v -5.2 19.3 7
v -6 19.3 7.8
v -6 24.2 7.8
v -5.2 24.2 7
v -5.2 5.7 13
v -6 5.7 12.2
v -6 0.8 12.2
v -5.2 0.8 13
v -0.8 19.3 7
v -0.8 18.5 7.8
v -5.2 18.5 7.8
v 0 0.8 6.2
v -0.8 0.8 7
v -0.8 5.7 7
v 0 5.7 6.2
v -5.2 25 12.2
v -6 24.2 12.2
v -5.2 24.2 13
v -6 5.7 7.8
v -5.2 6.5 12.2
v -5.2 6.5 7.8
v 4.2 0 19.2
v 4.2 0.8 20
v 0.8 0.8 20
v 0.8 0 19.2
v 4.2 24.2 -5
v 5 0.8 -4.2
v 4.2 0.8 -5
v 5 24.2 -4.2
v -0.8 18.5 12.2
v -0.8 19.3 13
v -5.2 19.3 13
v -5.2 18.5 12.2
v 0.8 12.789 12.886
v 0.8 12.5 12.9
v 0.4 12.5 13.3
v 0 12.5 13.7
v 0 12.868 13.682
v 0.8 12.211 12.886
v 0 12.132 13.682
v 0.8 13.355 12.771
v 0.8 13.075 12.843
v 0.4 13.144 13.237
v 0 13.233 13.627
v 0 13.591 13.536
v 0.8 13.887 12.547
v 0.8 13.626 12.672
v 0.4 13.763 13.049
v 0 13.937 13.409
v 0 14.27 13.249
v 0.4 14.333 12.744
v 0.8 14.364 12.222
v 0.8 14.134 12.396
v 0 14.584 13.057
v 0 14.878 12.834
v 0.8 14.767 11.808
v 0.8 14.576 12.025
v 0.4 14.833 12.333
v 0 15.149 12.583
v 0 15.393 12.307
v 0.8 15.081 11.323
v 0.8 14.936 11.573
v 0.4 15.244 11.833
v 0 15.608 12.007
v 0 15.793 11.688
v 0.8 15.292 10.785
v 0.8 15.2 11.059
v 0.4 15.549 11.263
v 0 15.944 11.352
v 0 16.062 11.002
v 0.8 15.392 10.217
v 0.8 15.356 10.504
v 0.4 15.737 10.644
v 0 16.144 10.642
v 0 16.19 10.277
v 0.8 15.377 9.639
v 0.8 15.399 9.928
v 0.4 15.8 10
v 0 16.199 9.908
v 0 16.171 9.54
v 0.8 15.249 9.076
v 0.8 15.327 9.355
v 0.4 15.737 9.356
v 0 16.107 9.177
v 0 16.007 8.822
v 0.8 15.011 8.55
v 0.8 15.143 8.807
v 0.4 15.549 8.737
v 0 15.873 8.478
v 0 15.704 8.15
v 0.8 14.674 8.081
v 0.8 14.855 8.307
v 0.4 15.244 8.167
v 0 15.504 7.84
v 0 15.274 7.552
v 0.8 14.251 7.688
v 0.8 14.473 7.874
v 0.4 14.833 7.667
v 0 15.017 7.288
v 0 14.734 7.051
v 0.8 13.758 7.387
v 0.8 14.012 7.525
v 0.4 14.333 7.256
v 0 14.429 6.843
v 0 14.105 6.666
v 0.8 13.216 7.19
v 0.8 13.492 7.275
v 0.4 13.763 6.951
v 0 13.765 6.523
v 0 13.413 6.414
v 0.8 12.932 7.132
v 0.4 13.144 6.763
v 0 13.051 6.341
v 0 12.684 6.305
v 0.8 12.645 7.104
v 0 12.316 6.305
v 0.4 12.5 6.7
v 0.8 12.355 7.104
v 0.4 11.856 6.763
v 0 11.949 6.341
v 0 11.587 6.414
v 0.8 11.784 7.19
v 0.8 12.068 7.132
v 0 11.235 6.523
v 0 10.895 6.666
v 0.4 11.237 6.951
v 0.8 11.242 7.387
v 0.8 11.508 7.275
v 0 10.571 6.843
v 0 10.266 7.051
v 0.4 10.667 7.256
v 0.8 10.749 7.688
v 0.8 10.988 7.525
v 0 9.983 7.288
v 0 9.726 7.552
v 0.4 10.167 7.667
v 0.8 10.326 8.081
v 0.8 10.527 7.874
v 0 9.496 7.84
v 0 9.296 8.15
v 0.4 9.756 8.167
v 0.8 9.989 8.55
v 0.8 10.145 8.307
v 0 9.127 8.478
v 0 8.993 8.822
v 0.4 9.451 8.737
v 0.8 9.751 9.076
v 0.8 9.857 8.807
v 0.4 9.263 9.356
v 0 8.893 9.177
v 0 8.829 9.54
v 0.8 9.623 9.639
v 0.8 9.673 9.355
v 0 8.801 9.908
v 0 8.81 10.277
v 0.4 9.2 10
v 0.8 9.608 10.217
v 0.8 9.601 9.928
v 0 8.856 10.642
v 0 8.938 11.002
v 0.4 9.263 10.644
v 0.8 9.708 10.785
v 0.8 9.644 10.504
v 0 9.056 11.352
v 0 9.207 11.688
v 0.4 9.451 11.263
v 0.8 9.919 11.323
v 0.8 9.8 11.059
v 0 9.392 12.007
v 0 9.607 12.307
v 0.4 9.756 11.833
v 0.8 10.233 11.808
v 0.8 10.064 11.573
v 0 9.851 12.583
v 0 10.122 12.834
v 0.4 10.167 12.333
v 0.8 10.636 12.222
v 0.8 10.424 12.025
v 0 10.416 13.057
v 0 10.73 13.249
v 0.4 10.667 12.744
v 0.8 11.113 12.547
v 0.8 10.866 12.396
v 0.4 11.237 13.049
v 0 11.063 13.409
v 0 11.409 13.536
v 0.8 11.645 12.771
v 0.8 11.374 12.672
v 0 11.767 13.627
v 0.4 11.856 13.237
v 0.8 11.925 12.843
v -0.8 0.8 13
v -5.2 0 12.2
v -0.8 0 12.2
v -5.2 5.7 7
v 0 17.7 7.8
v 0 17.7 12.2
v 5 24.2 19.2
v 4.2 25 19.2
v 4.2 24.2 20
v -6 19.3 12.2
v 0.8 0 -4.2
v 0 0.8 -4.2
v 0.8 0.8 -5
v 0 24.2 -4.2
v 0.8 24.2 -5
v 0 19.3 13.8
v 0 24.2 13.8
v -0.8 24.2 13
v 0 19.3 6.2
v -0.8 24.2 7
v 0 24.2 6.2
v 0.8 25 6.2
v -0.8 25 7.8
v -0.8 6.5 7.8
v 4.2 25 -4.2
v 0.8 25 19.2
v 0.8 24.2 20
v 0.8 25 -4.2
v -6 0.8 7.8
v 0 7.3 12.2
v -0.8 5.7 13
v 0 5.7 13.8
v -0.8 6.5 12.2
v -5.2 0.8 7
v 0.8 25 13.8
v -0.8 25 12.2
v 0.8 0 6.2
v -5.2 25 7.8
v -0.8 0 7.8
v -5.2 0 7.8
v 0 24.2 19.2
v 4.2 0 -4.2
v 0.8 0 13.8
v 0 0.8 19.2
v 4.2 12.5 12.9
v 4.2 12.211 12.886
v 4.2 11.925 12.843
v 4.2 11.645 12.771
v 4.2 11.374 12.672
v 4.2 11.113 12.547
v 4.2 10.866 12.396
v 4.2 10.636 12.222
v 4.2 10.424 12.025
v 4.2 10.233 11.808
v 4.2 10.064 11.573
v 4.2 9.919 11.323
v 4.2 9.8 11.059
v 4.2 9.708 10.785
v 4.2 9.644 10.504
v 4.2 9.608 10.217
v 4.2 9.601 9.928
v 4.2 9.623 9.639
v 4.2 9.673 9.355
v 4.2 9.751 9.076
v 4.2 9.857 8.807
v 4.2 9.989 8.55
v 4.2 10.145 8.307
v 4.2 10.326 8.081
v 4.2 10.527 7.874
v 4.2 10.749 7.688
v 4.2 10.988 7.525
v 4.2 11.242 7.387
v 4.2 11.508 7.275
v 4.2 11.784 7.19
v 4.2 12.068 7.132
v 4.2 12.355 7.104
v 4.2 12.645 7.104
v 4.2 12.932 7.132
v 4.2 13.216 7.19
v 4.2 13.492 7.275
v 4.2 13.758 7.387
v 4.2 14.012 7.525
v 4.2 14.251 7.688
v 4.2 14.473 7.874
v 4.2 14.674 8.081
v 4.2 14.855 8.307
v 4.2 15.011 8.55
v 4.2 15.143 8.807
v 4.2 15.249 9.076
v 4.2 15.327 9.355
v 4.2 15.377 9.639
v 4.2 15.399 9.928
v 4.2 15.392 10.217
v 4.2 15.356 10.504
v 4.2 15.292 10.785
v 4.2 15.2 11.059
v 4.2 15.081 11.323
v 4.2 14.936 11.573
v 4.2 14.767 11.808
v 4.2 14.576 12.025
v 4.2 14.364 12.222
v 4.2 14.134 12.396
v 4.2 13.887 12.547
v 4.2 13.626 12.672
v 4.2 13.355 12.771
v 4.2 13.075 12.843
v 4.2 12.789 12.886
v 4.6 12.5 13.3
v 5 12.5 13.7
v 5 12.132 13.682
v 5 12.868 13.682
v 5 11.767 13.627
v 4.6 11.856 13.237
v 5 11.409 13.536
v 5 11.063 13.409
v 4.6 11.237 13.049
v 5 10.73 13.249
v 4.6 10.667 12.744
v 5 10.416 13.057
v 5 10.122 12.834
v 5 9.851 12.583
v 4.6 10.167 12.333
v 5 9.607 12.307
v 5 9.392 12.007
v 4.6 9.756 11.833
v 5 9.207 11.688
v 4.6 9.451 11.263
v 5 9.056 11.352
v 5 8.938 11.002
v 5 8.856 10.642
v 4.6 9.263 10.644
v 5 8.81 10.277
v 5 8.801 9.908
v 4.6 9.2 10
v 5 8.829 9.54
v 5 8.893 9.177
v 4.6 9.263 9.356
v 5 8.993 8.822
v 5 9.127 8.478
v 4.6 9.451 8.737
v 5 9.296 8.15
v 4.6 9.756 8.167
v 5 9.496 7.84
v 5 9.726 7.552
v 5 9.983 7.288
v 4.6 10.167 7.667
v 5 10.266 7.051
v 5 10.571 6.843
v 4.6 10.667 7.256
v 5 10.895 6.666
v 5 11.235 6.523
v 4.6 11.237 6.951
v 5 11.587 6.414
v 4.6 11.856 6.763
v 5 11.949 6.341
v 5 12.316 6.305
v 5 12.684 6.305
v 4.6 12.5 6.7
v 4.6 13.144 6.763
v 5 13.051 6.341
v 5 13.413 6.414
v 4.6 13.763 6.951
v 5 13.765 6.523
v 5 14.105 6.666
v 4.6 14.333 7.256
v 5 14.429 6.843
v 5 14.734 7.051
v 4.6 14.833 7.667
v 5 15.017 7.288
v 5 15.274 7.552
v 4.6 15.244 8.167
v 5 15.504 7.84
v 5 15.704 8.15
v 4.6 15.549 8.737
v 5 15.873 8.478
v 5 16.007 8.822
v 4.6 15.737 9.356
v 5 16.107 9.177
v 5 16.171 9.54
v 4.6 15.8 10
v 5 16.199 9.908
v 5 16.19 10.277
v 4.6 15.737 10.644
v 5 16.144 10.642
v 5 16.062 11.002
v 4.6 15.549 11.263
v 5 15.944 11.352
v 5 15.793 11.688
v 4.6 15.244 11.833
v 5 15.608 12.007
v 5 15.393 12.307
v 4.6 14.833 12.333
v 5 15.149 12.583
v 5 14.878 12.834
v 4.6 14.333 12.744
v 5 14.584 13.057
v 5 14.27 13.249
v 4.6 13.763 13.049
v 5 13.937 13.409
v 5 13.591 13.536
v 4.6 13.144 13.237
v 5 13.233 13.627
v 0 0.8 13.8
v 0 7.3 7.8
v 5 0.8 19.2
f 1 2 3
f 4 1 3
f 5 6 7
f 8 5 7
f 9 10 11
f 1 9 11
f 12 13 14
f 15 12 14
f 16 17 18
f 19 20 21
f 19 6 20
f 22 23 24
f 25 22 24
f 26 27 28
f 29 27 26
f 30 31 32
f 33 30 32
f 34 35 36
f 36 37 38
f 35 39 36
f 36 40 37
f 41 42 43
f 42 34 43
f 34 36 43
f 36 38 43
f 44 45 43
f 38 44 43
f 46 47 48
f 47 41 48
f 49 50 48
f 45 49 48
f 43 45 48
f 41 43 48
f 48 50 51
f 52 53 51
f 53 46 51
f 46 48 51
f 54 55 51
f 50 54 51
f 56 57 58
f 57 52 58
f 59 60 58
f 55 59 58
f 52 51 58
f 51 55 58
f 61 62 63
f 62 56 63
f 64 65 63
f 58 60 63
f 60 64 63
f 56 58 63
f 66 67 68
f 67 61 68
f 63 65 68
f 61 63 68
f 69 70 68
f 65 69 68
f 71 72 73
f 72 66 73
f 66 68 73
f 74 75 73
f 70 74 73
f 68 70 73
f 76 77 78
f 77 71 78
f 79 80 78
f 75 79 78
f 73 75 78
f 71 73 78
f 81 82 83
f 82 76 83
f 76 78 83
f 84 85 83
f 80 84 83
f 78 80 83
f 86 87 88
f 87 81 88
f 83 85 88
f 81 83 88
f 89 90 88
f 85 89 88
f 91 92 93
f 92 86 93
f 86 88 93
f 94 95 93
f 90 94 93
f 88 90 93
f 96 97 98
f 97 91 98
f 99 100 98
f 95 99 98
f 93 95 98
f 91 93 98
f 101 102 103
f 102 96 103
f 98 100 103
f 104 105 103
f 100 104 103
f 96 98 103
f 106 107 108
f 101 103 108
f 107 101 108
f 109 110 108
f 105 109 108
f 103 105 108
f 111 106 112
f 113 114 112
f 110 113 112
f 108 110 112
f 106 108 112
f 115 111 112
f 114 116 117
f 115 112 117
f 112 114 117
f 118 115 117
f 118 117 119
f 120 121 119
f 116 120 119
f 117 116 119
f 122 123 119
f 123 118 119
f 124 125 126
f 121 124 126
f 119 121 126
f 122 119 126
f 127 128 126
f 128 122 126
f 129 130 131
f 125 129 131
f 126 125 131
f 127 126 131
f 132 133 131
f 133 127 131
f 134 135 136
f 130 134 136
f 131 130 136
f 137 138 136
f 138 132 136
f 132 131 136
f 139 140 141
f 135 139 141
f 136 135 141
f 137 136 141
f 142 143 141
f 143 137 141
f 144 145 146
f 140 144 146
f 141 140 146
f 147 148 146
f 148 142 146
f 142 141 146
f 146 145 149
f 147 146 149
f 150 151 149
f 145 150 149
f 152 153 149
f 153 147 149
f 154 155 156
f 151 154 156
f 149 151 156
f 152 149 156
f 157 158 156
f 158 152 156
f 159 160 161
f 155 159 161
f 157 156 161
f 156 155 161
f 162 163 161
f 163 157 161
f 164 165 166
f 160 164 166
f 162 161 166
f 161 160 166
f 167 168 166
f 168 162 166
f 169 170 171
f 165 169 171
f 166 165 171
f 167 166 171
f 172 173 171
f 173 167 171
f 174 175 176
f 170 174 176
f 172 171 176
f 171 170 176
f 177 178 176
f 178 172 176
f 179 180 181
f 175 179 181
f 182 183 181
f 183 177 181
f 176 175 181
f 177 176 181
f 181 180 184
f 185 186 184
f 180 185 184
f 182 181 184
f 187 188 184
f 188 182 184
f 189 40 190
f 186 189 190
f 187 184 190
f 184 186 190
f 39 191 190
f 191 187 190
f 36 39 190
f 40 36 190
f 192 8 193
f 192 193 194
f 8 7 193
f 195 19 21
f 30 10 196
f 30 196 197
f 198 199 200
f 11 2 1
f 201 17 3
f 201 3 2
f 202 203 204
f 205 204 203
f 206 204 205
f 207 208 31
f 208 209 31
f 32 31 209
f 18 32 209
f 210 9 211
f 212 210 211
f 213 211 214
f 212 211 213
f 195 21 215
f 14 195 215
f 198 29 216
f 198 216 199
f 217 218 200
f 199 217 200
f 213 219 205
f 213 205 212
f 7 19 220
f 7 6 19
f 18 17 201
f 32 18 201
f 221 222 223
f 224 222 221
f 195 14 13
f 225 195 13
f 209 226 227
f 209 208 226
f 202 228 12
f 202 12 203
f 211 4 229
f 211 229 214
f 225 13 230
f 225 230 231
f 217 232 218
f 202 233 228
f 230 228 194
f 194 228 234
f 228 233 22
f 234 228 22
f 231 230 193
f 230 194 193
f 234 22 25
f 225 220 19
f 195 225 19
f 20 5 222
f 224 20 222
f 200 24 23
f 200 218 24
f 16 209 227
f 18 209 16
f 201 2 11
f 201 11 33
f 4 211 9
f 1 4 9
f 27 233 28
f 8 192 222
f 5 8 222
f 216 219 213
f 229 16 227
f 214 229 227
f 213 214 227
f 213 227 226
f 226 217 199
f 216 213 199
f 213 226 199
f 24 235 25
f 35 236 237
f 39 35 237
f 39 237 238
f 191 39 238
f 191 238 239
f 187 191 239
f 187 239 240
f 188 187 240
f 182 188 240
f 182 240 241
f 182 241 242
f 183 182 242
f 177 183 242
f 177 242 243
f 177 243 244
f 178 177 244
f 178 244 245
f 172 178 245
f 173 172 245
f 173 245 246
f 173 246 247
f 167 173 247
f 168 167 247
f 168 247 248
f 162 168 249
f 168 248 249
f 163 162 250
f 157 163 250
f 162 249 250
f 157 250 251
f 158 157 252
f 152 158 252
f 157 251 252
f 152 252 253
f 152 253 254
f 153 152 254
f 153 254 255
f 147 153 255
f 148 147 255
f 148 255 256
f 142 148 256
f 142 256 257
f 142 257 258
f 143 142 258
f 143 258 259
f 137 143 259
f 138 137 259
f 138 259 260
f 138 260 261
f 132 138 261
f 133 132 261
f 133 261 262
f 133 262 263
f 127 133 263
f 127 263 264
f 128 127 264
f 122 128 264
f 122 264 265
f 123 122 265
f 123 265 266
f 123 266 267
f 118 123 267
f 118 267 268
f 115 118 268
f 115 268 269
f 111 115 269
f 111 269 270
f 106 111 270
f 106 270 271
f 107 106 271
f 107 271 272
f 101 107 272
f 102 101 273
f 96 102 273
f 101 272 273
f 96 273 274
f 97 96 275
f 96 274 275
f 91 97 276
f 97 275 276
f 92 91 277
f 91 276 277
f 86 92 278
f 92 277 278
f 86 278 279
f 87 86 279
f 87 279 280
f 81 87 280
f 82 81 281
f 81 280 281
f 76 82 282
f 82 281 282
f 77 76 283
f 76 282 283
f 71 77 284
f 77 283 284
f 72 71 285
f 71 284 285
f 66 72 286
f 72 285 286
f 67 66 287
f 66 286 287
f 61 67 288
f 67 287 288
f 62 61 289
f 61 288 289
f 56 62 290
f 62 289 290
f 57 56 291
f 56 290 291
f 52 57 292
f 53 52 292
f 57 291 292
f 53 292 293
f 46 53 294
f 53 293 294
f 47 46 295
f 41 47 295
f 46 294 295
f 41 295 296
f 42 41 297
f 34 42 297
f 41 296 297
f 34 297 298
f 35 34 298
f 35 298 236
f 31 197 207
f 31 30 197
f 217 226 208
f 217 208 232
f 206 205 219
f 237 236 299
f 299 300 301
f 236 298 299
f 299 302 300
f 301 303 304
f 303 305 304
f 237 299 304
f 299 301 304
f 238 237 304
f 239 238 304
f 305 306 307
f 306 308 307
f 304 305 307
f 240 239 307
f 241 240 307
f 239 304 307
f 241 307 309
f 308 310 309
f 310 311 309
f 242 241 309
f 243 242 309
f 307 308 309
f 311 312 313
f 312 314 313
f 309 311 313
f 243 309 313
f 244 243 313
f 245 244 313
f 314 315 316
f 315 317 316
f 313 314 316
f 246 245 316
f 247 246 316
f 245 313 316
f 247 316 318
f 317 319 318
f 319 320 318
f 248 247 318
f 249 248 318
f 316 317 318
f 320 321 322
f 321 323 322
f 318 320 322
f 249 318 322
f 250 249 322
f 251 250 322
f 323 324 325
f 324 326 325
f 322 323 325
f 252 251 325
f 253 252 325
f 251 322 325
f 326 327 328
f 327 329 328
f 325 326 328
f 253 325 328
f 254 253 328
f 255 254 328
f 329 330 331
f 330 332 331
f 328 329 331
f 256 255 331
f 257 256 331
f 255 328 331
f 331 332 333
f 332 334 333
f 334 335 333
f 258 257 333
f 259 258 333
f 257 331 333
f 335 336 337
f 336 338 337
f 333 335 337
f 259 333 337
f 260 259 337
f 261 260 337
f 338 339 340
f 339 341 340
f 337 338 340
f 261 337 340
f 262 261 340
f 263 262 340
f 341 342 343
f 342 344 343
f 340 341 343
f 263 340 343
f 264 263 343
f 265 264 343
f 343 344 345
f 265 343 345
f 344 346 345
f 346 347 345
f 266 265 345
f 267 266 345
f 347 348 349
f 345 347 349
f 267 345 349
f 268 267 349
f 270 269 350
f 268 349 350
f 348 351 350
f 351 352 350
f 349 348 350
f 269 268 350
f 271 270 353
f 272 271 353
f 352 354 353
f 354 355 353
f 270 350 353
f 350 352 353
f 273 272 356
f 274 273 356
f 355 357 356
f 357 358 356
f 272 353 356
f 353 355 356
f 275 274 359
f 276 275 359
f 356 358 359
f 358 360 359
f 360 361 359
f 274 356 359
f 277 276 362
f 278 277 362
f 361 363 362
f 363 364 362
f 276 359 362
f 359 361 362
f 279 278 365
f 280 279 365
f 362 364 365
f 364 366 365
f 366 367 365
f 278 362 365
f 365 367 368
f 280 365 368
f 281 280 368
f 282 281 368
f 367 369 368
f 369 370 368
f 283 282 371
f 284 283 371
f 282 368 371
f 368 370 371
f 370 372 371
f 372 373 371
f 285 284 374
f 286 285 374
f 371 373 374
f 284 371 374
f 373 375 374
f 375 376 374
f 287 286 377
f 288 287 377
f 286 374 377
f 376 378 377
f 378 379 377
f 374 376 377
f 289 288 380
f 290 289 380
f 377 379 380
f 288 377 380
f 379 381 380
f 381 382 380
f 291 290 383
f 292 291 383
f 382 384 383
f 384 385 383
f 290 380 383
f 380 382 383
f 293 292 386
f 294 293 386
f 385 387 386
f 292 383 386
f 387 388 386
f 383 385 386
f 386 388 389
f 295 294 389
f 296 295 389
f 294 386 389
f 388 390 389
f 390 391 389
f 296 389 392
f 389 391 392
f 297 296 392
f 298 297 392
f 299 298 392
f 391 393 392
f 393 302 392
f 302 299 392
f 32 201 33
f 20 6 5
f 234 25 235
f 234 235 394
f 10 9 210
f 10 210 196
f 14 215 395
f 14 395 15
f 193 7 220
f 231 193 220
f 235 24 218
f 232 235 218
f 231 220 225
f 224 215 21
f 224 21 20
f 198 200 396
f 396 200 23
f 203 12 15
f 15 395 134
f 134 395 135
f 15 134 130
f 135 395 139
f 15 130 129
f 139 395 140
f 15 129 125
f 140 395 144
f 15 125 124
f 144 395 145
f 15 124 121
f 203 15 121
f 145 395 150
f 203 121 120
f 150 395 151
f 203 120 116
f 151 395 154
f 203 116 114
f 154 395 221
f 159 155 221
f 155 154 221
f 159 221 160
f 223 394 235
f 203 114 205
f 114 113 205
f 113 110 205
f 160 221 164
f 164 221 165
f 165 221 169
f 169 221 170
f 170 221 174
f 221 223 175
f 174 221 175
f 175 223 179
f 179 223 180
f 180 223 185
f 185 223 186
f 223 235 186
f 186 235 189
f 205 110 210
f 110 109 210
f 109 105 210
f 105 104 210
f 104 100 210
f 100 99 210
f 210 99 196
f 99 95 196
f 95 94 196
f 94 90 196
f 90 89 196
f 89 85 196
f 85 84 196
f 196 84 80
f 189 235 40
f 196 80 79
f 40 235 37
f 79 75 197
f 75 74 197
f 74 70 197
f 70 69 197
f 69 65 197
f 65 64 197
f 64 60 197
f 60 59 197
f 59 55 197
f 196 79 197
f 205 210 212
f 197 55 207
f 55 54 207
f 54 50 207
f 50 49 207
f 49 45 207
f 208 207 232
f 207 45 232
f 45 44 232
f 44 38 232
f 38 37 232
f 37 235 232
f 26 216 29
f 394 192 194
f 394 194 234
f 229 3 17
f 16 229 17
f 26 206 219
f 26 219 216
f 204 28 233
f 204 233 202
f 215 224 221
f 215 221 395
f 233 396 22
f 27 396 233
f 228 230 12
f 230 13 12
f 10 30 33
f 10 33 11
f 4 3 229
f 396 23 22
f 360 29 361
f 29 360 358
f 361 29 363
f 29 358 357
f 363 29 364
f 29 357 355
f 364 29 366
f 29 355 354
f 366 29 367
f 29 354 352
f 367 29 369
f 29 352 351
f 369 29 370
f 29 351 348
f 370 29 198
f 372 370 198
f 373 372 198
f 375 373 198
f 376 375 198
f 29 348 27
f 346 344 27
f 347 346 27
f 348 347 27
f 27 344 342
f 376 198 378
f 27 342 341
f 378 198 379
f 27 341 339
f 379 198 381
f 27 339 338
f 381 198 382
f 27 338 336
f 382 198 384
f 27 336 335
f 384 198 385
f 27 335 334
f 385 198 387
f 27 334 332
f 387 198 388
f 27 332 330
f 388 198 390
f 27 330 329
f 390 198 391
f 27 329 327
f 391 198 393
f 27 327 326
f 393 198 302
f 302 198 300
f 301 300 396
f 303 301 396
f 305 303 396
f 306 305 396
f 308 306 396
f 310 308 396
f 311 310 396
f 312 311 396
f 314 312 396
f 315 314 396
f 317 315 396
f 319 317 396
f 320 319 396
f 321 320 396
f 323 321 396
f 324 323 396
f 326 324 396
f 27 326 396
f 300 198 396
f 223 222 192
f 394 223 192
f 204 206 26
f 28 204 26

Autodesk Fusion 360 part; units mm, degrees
sketch "Bracket Profile" plane through (0, 0, 0) normal (0, 0, 1) x (1, 0, 0) in component "Bracket"
  line L0 (0, 0) -> (0, 25)
  line L1 (0, 25) -> (5, 25)
  line L2 (5, 25) -> (5, 20)
  line L3 (5, 20) -> (5, 0)
  line L4 (5, 0) -> (0, 0)
  dimension "d1" = 5
  dimension "d2" = 5
  dimension "d3" = 25
  dimension "d4" = 5
extrude "Extrude1" add sketch "Bracket Profile" along normal blind 20 in component "Bracket"
sketch "Clearance Hole" plane through (0, 0, 0) normal (-1, 0, 0) x (0, -1, 0) in component "Bracket"
  line L0 (-25, 0) -> (0, 0)
  line L1 (0, 0) -> (0, 20)
  line L2 (0, 20) -> (-25, 20)
  line L3 (-25, 20) -> (-25, 0)
  line L4 (-25, 10) -> (0, 10) construction
  line L5 (-12.5, 20) -> (-12.5, 0) construction
  circle A0 centre (-12.5, 10) radius 2.9
  circle A1 centre (-12.5, 10) radius 4.5
  line L6 (0, 13) -> (-25, 13)
  line L7 (-25, 13) -> (-25, 7)
  line L8 (-25, 7) -> (0, 7)
  line L9 (0, 7) -> (0, 13)
  line L10 (0, 13) -> (-25, 7) construction
  line L11 (-25, 13) -> (0, 7) construction
  line L12 (-6.5, 13) -> (-18.5, 13)
  line L13 (-18.5, 13) -> (-18.5, 7)
  line L14 (-18.5, 7) -> (-6.5, 7)
  line L15 (-6.5, 7) -> (-6.5, 13)
  line L16 (-6.5, 13) -> (-18.5, 7) construction
  line L17 (-18.5, 13) -> (-6.5, 7) construction
  point P0 (-12.5, 10)
  point P1 (-12.5, 10)
  dimension "d9" = 5.8
  dimension "d13" = 9
  dimension "d20" = 25
  dimension "d21" = 6
  dimension "d24" = 12
  dimension "d25" = 6
extrude "Extrude3" add sketch "Clearance Hole" along normal blind 6 contours L3 L6 L7 L8 L13 | L1 L6 L8 L9 L15 in component "Bracket"
hole "Hole1" at (0, 12.5, 10) direction (1, 0, 0) diameter 5.8 end through all in component "Bracket"
sketch "Sketch3" plane through (0, 25, 0) normal (0, 1, 0) x (-1, 0, 0) in component "Bracket"
  line L0 (-5, 0) -> (0, 0)
  line L1 (0, 0) -> (0, 7)
  line L2 (0, 7) -> (6, 7)
  line L3 (6, 7) -> (6, 13)
  line L4 (6, 13) -> (0, 13)
  line L5 (0, 13) -> (0, 20)
  line L6 (0, 20) -> (-5, 20)
  line L7 (0, 20) -> (-25, 20)
  line L8 (-25, 20) -> (-25, 15)
  line L9 (-25, 15) -> (0, 15)
  line L10 (0, 15) -> (0, 20)
  line L11 (-5, 20) -> (-5, 0)
  dimension "d28" = 25
  dimension "d29" = 5
extrude "Extrude5" add 1 faces at (1.6667, 16.6667, 0) along direction (0, 0, -1) blind 5 in component "Bracket"
chamfer "Chamfer2" distance 0.8 angle 45 12 faces at (0, 12.5, -0.9667) (-6, 4.3333, 11) (-6, 22.8333, 11) (3.3333, 25, 7.3333) (1.6667, 16.6667, 20) (-2, 20.6667, 13) (-2, 2.1667, 13) (-2, 6.5, 9) (-4, 18.5, 9) (3.3333, 0, 7.3333) (5, 12.5, -0.9667) (1.6667, 16.6667, -5) in component "Bracket"
component "Bracket" placed x (1, 0, 0) y (0, 1, 0) z (0, 0, 1) at (0, 0, 0)
equation "d1 = BracketLipSize"
equation "d2 = BracketLipSize"
equation "d3 = ExtrusionSize + BracketLipSize"
equation "d4 = BracketLipSize"
equation "ExtrusionSize = 20 mm"
equation "BracketLipSize = 5 mm"
equation "d7 = ExtrusionSize"
equation "d9 = ScrewClearanceHole"
equation "ScrewClearanceHole = 5.8 mm"
equation "d11 = ScrewClearanceHole"
equation "d13 = ScrewHeadClearance"
equation "ScrewHeadClearance = 9 mm"
equation "Chamfer = 0.8 mm"
equation "Tounge = 6 mm"
equation "d20 = ExtrusionSize + BracketLipSize"
equation "d21 = Tounge"
equation "d22 = Tounge"
equation "d24 = NutClearance"
equation "d25 = Tounge"
equation "NutClearance = 12 mm"
equation "d28 = ExtrusionSize + BracketLipSize"
equation "d29 = BracketLipSize"
equation "d32 = BracketLipSize"
equation "d34 = Chamfer"
